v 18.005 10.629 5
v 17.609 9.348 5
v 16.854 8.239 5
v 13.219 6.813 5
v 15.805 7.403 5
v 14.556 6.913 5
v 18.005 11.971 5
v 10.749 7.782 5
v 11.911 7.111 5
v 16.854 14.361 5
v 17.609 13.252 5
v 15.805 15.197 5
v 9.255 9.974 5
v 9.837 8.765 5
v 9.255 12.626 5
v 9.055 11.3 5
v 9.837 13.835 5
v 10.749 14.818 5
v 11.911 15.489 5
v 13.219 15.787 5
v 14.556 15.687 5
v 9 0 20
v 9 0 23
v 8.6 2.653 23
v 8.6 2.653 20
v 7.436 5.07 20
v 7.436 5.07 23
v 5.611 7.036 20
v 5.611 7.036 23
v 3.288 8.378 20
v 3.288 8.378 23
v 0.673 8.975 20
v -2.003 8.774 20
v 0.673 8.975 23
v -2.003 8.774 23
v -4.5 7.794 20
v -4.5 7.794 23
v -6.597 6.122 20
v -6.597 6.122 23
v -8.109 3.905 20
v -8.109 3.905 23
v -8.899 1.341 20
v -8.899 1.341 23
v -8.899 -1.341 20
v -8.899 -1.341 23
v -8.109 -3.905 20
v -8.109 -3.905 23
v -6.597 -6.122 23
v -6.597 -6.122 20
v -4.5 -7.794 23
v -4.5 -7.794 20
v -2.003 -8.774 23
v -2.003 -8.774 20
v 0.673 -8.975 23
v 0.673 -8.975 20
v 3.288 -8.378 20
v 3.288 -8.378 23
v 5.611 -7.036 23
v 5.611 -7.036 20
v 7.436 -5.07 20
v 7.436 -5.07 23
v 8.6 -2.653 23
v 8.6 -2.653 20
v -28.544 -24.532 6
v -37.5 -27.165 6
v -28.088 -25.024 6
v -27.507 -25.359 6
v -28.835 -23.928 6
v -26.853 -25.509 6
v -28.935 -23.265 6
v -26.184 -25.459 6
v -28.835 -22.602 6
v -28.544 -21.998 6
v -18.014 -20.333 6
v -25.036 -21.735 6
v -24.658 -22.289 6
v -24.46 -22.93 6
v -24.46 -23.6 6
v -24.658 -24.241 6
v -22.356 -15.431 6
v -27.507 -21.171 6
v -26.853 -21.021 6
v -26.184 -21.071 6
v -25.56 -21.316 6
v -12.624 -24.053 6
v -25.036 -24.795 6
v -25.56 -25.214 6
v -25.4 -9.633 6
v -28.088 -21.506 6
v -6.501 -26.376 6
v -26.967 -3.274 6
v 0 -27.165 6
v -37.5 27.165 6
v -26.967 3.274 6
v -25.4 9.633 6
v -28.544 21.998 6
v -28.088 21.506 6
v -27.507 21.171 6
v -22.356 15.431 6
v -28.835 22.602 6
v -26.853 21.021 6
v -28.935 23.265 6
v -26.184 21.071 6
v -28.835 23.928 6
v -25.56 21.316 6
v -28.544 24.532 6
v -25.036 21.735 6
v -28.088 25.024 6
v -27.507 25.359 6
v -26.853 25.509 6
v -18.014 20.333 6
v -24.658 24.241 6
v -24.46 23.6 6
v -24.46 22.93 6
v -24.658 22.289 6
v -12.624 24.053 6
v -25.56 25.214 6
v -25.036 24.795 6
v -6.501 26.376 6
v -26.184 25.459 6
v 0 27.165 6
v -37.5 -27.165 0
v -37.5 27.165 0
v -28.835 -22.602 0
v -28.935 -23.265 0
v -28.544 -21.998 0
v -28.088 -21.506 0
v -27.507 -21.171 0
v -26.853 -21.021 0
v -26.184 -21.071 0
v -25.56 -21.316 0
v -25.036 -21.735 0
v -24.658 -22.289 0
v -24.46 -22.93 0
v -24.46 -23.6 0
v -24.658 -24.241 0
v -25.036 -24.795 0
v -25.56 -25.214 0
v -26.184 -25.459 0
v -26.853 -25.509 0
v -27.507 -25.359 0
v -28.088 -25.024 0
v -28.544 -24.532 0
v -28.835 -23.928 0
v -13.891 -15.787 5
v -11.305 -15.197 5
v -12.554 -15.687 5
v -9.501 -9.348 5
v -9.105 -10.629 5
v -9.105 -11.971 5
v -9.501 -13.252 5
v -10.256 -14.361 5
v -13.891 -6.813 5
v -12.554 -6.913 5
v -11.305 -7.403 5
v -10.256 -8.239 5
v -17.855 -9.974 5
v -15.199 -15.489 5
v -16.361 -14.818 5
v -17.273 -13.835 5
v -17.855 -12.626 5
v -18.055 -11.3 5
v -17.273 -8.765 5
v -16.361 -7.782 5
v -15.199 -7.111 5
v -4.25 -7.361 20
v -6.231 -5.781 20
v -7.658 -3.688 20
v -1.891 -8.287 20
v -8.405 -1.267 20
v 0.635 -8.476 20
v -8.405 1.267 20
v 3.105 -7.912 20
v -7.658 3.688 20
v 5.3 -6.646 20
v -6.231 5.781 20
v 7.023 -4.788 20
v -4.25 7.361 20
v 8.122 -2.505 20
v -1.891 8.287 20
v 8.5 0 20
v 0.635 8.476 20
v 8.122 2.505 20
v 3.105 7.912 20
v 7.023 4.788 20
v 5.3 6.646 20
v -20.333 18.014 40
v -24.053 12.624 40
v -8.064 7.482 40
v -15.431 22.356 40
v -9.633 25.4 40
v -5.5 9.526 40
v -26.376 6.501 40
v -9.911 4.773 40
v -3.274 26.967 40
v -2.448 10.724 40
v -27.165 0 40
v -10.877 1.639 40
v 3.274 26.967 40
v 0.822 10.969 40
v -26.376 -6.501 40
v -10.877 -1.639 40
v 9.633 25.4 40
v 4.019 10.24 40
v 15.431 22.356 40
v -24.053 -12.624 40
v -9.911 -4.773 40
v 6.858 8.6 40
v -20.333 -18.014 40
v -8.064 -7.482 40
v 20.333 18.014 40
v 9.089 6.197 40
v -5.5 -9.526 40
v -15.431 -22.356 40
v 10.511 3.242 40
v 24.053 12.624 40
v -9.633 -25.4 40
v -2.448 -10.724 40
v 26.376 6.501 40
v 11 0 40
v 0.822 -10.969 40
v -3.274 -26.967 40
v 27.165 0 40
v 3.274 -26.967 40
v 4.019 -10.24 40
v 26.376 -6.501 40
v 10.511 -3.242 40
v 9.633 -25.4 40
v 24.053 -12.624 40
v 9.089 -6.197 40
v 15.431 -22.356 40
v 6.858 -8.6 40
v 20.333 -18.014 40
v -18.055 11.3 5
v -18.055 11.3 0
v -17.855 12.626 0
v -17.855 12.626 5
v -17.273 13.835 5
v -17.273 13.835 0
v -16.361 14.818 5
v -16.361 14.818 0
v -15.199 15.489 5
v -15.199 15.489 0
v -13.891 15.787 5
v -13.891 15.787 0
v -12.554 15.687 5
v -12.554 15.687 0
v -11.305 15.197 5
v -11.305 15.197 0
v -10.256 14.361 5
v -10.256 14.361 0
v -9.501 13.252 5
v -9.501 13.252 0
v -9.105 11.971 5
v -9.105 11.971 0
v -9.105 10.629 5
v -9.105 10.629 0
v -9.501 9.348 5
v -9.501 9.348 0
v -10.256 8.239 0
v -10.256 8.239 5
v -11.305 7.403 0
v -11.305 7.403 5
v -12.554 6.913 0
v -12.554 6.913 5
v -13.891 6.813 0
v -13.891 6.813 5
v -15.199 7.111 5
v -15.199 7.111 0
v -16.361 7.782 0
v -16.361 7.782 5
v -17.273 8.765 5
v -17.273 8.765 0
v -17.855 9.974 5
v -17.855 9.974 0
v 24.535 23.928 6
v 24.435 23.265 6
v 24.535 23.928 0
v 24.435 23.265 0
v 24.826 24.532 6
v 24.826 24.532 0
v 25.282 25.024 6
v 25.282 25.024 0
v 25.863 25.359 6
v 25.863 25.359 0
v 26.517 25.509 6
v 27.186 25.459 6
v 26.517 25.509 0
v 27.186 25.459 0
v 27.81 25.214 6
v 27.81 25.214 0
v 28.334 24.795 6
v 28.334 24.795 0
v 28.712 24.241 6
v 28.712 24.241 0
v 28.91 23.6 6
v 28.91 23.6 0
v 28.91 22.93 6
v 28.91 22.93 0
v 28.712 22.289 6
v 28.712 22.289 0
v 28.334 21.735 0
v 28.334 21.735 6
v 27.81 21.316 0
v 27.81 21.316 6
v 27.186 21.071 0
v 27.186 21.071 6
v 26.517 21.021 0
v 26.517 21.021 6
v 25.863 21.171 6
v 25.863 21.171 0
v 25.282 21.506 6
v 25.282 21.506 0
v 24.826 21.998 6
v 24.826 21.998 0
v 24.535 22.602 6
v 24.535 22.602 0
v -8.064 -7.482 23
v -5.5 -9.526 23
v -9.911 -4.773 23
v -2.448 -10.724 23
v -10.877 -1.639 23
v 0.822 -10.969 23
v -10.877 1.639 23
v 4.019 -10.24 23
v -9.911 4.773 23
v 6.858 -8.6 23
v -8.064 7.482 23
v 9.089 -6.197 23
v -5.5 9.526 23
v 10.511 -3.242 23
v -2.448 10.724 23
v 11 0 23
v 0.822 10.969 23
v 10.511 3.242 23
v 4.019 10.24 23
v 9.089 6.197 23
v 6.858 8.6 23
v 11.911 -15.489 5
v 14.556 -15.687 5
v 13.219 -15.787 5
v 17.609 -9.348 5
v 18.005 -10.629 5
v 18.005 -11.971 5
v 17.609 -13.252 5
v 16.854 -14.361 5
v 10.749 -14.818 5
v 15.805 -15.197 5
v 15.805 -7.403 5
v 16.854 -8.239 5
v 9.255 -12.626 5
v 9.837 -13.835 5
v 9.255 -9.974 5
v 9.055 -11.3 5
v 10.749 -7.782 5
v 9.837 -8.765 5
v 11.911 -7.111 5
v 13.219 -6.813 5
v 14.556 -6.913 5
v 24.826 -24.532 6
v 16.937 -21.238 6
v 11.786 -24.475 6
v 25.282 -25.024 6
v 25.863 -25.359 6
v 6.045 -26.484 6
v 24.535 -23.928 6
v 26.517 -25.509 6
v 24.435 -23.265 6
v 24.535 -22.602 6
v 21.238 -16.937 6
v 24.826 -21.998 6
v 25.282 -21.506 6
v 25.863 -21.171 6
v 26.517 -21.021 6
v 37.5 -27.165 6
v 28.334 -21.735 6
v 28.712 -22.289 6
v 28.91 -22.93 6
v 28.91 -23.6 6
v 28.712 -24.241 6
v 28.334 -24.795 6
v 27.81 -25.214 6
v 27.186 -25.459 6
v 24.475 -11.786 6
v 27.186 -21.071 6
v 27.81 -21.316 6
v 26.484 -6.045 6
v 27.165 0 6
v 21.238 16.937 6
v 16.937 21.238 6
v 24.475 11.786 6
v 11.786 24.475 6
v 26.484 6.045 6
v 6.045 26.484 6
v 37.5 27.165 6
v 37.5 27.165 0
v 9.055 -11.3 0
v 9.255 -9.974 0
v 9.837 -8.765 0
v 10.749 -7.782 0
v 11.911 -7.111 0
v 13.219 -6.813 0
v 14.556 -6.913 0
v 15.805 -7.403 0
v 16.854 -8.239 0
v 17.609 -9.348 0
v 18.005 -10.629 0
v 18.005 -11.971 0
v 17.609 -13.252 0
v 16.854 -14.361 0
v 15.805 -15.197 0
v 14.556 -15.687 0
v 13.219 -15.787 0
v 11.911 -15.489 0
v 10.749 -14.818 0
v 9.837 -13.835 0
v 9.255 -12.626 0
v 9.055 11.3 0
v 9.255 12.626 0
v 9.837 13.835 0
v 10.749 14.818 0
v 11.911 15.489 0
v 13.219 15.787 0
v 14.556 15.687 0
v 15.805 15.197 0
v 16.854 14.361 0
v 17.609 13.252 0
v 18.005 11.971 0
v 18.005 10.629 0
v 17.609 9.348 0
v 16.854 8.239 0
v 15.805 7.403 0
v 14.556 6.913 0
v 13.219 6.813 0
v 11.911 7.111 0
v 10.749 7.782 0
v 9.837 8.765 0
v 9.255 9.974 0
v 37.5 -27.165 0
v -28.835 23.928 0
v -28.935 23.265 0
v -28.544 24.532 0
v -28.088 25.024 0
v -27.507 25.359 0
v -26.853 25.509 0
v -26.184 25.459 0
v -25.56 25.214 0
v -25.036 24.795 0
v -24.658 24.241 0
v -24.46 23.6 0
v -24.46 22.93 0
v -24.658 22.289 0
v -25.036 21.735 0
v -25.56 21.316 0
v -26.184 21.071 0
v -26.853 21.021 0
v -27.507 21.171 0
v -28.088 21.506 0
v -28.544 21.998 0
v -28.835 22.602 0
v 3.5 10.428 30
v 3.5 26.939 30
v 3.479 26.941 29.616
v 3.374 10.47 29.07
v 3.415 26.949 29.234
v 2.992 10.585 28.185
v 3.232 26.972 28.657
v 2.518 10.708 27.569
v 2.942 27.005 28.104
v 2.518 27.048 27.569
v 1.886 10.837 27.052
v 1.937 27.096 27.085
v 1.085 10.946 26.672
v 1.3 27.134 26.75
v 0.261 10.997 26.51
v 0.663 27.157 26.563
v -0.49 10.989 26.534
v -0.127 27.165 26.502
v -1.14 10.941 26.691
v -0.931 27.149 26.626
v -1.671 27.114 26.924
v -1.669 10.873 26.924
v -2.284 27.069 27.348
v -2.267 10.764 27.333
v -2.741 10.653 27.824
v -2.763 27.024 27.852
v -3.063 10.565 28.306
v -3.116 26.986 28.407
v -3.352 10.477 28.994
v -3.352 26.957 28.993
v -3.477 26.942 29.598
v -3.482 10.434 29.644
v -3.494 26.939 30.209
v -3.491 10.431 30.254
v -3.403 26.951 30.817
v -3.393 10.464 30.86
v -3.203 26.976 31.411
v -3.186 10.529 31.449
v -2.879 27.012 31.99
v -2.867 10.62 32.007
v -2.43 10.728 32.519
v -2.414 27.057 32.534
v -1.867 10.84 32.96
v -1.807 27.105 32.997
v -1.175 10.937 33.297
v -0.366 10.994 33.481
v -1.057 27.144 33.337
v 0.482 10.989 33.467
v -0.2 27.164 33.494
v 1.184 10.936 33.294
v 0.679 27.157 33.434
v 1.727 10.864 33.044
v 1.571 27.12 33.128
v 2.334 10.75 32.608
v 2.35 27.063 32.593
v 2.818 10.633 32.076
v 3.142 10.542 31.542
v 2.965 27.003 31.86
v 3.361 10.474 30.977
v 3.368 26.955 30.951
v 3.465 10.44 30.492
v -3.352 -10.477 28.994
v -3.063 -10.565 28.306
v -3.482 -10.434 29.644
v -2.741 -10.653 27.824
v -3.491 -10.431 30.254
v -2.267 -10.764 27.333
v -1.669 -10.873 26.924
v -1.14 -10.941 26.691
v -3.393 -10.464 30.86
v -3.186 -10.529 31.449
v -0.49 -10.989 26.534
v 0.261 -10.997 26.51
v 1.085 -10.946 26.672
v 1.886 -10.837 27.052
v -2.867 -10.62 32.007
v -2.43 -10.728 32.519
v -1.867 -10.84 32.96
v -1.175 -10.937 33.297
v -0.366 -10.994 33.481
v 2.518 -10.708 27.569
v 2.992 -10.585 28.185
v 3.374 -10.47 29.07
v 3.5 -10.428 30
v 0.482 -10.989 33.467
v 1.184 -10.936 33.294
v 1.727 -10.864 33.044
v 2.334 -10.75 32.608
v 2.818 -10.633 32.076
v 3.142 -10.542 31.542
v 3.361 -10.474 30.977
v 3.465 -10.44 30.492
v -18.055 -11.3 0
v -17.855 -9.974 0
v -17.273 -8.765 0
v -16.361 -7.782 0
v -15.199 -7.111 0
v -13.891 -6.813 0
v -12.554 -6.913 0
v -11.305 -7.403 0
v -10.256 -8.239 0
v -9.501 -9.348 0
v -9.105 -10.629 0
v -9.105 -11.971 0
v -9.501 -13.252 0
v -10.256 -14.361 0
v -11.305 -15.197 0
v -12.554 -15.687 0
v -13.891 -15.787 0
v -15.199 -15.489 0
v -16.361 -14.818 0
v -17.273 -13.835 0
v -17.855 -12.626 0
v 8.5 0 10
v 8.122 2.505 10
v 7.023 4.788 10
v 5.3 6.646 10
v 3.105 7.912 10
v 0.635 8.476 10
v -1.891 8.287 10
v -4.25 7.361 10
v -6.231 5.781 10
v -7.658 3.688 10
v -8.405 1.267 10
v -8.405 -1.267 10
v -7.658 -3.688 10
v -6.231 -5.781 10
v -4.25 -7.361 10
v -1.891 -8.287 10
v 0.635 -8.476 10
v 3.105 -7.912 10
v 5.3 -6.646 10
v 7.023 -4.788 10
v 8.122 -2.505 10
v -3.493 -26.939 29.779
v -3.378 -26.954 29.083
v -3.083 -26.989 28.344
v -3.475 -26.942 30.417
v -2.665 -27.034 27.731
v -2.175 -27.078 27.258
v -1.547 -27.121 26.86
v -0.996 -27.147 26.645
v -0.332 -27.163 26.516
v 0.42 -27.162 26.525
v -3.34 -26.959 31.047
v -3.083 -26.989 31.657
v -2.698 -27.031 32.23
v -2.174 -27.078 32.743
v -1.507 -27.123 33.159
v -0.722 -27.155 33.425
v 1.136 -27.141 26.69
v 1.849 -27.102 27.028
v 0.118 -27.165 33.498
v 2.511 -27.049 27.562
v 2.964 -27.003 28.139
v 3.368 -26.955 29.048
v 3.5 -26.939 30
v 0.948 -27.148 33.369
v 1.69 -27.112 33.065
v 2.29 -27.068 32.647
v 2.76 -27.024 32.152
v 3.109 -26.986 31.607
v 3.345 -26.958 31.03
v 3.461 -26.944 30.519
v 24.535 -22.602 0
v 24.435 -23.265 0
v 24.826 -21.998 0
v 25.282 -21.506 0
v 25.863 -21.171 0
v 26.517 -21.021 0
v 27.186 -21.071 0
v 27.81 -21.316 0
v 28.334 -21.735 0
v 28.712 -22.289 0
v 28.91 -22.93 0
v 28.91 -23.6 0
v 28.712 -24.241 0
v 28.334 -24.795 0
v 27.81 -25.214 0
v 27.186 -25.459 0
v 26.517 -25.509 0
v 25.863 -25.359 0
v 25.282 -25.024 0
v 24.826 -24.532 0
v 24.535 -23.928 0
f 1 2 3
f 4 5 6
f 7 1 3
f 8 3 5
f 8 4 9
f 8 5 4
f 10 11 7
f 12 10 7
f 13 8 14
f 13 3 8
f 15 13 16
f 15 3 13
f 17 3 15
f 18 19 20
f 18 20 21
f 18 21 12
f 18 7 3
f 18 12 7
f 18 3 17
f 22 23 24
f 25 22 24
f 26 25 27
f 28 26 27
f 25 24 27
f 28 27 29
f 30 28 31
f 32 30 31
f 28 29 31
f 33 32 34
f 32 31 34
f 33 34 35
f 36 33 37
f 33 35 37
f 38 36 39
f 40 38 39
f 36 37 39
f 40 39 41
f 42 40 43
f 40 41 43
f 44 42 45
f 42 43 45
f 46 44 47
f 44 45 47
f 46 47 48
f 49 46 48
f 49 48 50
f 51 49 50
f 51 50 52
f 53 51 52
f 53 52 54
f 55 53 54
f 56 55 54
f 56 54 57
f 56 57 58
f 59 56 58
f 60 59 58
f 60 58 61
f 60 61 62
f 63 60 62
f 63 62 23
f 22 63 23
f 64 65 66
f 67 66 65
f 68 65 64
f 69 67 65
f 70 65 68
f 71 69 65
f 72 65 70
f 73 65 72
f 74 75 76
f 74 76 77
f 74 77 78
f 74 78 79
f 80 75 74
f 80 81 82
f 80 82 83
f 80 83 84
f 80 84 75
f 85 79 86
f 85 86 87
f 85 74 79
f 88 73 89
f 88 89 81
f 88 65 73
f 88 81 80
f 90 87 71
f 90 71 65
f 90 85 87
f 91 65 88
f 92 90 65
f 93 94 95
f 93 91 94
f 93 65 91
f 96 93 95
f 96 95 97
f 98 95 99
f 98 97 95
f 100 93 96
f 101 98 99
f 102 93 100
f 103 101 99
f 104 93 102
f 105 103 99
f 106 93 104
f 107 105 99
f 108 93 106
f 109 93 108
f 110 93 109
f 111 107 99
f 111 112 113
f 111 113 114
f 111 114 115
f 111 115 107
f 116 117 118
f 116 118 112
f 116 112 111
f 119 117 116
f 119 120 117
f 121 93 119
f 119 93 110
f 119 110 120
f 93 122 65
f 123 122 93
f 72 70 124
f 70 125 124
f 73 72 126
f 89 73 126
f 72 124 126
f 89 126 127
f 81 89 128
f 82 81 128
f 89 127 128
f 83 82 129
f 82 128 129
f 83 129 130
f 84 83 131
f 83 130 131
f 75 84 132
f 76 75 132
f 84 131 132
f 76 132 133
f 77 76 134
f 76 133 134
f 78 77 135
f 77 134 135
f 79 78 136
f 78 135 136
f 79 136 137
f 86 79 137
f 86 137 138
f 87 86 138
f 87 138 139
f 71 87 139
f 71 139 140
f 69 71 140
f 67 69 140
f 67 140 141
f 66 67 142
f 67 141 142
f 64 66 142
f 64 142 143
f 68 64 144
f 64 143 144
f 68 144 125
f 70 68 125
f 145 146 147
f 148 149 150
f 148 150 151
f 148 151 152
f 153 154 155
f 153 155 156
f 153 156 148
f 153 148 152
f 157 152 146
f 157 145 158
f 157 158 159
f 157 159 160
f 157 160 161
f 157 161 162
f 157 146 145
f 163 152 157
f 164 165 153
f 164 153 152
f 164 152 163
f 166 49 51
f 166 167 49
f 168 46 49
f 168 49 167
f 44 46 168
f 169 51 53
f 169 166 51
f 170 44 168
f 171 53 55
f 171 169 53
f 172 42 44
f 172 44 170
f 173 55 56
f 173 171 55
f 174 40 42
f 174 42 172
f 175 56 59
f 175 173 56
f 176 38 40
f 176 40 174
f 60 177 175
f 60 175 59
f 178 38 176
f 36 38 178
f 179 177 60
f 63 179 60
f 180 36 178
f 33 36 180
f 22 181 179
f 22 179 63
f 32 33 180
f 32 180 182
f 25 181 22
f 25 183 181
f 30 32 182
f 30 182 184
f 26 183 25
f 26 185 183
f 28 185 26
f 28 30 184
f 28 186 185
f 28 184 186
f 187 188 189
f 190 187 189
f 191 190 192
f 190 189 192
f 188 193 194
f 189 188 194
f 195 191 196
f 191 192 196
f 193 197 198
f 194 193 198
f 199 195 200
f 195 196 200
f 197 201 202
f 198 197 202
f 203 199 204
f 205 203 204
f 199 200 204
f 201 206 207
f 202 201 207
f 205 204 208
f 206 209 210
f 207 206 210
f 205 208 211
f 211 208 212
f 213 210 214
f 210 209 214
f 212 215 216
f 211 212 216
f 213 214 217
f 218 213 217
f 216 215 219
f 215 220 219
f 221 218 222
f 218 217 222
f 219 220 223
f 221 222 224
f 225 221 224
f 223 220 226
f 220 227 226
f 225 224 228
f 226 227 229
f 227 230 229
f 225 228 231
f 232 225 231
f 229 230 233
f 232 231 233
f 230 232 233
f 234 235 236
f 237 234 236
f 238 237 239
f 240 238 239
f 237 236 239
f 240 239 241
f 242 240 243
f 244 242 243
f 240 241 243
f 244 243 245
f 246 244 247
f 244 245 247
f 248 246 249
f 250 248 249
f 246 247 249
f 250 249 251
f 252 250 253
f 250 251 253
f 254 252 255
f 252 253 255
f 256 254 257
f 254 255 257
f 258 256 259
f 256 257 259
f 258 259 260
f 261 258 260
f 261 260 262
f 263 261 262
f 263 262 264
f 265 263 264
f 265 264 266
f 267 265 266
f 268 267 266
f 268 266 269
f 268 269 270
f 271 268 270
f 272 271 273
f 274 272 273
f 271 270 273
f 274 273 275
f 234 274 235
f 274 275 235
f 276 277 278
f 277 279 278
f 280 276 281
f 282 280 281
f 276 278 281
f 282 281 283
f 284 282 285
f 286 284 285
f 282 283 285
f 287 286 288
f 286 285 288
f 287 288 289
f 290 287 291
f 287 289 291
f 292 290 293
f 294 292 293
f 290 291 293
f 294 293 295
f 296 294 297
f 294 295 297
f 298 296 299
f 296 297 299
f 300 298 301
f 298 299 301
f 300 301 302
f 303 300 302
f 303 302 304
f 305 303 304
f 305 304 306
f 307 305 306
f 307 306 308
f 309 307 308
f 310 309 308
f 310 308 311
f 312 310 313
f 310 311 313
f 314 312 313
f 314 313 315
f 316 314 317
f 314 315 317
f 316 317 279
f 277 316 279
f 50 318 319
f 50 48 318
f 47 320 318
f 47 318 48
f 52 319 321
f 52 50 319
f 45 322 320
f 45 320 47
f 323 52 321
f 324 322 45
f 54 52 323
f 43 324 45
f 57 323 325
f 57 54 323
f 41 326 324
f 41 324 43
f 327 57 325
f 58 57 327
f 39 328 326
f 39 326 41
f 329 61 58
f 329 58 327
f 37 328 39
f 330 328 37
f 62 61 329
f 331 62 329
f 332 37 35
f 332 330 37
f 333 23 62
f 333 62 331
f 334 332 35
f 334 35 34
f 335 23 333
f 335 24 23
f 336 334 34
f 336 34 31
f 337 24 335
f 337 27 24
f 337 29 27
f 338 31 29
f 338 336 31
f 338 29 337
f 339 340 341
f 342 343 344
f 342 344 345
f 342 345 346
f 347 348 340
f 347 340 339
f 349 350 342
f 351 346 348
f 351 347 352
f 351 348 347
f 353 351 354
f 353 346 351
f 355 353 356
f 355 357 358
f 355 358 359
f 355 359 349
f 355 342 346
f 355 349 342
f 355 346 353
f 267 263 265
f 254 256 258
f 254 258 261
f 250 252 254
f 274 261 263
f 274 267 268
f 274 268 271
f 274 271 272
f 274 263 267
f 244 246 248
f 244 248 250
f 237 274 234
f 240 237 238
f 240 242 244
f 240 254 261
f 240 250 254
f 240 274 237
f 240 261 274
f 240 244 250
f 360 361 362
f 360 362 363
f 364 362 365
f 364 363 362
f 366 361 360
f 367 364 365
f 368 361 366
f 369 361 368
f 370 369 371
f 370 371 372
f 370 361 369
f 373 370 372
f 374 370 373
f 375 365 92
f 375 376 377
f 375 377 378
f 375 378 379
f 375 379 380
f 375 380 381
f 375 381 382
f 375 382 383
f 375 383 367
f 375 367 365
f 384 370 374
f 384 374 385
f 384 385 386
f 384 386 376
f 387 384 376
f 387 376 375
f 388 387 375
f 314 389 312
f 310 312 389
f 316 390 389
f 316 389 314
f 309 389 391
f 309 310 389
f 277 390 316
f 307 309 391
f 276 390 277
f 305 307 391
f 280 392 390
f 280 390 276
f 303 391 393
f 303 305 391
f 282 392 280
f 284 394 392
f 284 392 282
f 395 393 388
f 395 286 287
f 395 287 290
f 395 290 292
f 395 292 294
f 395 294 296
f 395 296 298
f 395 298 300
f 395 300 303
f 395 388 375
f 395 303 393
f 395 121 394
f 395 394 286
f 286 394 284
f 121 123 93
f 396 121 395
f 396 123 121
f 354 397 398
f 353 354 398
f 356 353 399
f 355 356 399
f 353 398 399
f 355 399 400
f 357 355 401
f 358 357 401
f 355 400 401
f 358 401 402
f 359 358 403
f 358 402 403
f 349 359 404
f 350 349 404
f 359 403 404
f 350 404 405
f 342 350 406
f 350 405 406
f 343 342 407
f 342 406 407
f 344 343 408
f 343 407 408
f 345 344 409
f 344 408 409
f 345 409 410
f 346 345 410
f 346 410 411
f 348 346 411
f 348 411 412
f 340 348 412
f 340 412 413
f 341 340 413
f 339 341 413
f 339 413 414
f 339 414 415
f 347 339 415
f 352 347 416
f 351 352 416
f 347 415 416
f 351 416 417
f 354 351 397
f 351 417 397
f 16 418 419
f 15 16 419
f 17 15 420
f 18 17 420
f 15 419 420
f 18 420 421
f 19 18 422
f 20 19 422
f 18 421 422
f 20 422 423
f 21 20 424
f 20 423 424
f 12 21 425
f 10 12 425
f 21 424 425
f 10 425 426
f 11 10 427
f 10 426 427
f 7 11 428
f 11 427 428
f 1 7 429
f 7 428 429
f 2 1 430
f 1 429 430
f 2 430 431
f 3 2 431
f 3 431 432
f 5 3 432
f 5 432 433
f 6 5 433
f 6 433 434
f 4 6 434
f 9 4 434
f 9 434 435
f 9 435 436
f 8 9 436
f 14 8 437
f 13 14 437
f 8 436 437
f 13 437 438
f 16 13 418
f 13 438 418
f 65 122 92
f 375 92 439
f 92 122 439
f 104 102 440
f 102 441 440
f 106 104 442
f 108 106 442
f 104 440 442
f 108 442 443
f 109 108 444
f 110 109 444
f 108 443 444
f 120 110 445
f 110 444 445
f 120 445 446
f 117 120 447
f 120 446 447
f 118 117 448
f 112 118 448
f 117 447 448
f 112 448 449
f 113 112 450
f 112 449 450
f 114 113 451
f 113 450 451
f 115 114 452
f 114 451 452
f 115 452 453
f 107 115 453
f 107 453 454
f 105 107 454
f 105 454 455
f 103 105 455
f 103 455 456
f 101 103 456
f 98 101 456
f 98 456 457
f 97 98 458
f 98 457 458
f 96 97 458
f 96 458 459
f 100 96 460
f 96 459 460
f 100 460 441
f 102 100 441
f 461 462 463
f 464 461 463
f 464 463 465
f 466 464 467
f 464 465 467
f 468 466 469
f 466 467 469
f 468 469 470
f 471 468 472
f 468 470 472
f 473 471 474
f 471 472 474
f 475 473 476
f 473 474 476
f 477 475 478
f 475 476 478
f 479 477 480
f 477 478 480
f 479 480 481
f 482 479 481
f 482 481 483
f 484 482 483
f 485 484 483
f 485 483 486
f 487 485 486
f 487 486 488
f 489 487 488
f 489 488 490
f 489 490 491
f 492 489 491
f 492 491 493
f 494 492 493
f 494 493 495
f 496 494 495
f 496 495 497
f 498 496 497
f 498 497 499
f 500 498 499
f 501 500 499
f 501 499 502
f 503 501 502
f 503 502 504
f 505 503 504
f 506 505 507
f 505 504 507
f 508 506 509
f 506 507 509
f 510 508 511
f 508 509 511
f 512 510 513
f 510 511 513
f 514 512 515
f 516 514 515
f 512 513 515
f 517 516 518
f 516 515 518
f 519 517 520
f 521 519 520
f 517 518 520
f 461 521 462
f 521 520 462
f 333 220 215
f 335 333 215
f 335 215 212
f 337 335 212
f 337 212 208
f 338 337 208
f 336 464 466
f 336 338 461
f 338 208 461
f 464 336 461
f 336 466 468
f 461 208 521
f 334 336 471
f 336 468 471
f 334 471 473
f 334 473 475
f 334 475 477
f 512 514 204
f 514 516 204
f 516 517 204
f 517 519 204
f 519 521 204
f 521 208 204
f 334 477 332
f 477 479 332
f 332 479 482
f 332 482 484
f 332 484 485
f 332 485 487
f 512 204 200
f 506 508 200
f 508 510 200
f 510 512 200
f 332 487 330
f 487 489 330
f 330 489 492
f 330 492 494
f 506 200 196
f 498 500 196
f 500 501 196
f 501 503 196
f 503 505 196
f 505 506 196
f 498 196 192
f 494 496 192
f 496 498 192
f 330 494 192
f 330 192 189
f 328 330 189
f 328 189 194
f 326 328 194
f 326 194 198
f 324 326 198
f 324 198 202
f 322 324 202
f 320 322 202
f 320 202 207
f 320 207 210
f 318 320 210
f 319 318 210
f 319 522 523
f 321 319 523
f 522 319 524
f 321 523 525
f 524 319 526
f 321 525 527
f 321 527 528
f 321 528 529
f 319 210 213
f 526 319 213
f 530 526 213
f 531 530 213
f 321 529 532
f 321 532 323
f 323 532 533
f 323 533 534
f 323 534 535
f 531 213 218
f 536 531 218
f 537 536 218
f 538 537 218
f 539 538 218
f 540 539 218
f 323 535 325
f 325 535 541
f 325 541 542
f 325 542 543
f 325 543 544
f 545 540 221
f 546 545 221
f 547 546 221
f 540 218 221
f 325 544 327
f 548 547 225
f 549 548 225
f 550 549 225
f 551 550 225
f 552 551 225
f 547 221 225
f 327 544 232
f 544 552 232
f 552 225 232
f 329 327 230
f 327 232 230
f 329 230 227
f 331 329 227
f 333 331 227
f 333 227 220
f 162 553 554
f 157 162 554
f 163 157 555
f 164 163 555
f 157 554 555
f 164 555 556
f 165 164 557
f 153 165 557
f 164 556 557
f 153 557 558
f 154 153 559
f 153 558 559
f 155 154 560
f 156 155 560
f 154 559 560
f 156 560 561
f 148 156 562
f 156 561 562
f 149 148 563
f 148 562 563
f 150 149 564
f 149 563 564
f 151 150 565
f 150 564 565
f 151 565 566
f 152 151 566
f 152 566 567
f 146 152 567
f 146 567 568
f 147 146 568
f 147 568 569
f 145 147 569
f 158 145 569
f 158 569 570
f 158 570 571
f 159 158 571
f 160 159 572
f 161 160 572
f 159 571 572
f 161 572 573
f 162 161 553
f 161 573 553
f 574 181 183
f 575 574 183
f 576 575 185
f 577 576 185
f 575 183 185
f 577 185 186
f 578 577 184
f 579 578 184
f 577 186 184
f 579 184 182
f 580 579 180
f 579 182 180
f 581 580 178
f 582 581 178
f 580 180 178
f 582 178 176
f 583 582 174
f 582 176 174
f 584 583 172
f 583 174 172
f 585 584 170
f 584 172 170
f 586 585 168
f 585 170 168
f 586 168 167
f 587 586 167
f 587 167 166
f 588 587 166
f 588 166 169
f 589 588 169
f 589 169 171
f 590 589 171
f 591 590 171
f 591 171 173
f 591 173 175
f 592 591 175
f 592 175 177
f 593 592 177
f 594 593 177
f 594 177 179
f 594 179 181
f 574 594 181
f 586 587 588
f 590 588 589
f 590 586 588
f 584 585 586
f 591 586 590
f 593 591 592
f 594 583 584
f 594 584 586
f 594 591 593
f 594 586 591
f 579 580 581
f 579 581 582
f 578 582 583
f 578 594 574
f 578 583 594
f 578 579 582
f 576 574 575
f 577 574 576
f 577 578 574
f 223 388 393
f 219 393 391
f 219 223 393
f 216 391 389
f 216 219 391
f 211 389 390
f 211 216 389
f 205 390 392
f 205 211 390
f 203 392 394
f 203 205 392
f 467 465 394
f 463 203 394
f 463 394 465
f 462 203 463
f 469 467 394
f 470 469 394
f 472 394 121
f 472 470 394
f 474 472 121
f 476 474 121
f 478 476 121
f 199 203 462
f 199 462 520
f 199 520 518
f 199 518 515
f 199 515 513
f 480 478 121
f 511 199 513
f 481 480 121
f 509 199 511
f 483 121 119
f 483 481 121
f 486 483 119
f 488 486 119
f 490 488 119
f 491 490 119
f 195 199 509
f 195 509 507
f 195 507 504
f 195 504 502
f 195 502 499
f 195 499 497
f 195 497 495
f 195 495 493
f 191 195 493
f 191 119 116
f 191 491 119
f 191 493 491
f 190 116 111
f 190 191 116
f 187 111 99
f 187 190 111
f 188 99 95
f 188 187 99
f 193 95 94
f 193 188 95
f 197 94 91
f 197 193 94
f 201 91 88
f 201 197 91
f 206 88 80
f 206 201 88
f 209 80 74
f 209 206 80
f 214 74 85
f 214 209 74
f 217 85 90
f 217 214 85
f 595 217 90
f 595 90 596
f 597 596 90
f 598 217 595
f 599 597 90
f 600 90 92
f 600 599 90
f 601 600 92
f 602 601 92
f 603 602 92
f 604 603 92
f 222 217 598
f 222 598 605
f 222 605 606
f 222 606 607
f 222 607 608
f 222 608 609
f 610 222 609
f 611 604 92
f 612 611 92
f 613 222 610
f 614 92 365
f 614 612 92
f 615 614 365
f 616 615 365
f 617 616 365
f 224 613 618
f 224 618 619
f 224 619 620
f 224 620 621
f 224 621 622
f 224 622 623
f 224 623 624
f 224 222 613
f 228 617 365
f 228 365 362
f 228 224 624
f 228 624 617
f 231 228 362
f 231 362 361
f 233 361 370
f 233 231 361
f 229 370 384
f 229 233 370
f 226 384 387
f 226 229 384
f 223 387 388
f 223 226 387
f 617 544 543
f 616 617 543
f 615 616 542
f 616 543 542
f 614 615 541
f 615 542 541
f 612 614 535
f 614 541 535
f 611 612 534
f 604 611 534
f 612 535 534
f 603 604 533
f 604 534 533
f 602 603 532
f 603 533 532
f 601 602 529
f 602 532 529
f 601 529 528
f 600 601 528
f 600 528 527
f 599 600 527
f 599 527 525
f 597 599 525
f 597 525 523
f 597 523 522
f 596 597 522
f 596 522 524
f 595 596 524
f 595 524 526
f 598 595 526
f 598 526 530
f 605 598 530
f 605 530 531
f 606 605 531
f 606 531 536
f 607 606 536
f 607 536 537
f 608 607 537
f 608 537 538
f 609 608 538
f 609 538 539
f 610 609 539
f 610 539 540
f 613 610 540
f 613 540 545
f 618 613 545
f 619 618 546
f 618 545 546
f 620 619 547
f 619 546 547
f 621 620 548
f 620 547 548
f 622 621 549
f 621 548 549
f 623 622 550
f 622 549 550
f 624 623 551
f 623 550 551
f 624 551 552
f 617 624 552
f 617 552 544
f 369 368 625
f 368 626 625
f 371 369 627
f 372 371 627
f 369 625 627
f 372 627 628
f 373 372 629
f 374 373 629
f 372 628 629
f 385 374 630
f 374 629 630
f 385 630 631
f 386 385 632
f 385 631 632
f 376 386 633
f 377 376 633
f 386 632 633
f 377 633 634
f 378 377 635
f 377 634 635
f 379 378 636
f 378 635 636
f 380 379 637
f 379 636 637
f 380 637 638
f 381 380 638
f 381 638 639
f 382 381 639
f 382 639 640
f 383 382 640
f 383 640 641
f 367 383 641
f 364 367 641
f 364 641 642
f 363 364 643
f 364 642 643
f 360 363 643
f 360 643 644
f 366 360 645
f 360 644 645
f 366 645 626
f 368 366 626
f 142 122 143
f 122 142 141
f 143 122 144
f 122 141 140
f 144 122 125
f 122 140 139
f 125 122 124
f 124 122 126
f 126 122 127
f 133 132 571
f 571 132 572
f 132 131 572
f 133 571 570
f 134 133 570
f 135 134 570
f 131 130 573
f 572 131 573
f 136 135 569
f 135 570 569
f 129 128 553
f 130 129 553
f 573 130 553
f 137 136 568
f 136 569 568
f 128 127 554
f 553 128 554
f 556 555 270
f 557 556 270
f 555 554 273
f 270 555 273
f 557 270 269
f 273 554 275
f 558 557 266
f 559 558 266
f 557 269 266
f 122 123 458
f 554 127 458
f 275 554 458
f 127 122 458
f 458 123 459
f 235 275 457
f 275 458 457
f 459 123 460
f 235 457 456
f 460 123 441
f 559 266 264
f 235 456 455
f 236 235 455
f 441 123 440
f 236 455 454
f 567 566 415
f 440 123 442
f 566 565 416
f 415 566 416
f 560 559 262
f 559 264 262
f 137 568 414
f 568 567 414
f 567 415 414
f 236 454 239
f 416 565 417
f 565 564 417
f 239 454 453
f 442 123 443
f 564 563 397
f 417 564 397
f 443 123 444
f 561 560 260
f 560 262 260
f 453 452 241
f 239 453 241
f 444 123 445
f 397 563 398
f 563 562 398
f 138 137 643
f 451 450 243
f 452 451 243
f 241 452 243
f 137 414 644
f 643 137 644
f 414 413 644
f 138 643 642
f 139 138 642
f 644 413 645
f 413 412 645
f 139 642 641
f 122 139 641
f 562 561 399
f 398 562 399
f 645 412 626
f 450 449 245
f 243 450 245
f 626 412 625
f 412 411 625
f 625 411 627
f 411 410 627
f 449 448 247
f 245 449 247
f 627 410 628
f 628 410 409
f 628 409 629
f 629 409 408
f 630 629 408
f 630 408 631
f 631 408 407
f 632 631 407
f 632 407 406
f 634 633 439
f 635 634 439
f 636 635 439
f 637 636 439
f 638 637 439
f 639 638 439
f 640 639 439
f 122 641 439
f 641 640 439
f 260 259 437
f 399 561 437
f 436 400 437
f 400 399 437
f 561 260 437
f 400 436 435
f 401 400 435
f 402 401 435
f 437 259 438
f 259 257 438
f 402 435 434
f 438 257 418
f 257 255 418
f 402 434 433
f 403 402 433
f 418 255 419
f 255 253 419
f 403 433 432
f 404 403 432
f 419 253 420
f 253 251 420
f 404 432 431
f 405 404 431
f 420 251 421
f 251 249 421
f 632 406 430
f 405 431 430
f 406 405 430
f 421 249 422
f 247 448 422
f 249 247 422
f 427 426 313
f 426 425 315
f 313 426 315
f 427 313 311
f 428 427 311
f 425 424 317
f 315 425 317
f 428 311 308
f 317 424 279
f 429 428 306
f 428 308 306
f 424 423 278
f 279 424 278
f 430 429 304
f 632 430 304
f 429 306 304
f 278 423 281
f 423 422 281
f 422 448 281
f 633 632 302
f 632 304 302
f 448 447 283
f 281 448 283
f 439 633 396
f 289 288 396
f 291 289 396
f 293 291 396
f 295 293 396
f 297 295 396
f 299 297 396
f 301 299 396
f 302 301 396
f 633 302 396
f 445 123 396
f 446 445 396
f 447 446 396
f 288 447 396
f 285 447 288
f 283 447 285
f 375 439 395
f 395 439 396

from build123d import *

# Parameters (mm, degrees)
SKETCH1_W                      = 75
SKETCH1_H                      = 54.33
BOSS_EXTRUDE1_DEPTH            = 45
CBORE_FOR_M4_SHCS1_D           = 4.5
CBORE_FOR_M4_SHCS1_CBORE_D     = 8
CBORE_FOR_M4_SHCS1_CBORE_DEPTH = 4
SKETCH4_OUTSIDE_W              = 97.592
SKETCH4_OUTSIDE_H              = 67.592
SKETCH4_OUTSIDE_W_2            = 75
SKETCH4_OUTSIDE_H_2            = 40
CUT_EXTRUDE1_DEPTH             = 55.33
SKETCH5_R                      = 8.5
CUT_EXTRUDE2_DEPTH             = 30
SKETCH5_3_R                    = 9
CUT_EXTRUDE3_DEPTH             = 20
SKETCH5_4_R                    = 11
CUT_EXTRUDE4_DEPTH             = 17
SKETCH6_R                      = 3.5
CUT_EXTRUDE5_DEPTH             = 55.33
SKETCH29_OUTSIDE_W             = 97.176
SKETCH29_OUTSIDE_H             = 76.506
SKETCH29_OUTSIDE_R             = 27.165
CUT_EXTRUDE6_DEPTH             = 34
SKETCH30_R                     = 4.5
CUT_EXTRUDE7_DEPTH             = 5


with BuildPart() as part:
    # Sketch1 → Boss-Extrude1 (new body)
    with BuildSketch(Plane.XY):
        Rectangle(SKETCH1_W, SKETCH1_H)
    extrude(amount=BOSS_EXTRUDE1_DEPTH)

    # CBORE for M4 SHCS1 (through all)
    with Locations(Plane.XY.offset(45)):
        with Locations((26.685, -23.265), (26.685, 23.265), (-26.685, 23.265), (-26.685, -23.265)):
            CounterBoreHole(CBORE_FOR_M4_SHCS1_D / 2, CBORE_FOR_M4_SHCS1_CBORE_D / 2, CBORE_FOR_M4_SHCS1_CBORE_DEPTH)

    # Sketch4 outside → Cut-Extrude1 (cut, through all)
    with BuildSketch(Plane.XZ.offset(27.165)):
        with Locations((0, 22.5)):
            Rectangle(SKETCH4_OUTSIDE_W, SKETCH4_OUTSIDE_H)
        with Locations((0, 20)):
            Rectangle(SKETCH4_OUTSIDE_W_2, SKETCH4_OUTSIDE_H_2, mode=Mode.SUBTRACT)
    extrude(amount=-CUT_EXTRUDE1_DEPTH, mode=Mode.SUBTRACT)

    # Sketch5 → Cut-Extrude2 (cut)
    with BuildSketch(Plane.XY.offset(40)):
        Circle(SKETCH5_R)
    extrude(amount=-CUT_EXTRUDE2_DEPTH, mode=Mode.SUBTRACT)

    # Sketch5<3> → Cut-Extrude3 (cut)
    with BuildSketch(Plane.XY.offset(40)):
        Circle(SKETCH5_3_R)
    extrude(amount=-CUT_EXTRUDE3_DEPTH, mode=Mode.SUBTRACT)

    # Sketch5<4> → Cut-Extrude4 (cut)
    with BuildSketch(Plane.XY.offset(40)):
        Circle(SKETCH5_4_R)
    extrude(amount=-CUT_EXTRUDE4_DEPTH, mode=Mode.SUBTRACT)

    # Sketch6 → Cut-Extrude5 (cut, through all)
    with BuildSketch(Plane(origin=(0, 27.165, 0), x_dir=(1, 0, 0), z_dir=(0, 1, 0))):
        with Locations((0, -30)):
            Circle(SKETCH6_R)
    extrude(amount=-CUT_EXTRUDE5_DEPTH, mode=Mode.SUBTRACT)

    # Sketch29 outside → Cut-Extrude6 (cut)
    with BuildSketch(Plane.XY.offset(40)):
        Rectangle(SKETCH29_OUTSIDE_W, SKETCH29_OUTSIDE_H)
        Circle(SKETCH29_OUTSIDE_R, mode=Mode.SUBTRACT)
    extrude(amount=-CUT_EXTRUDE6_DEPTH, mode=Mode.SUBTRACT)

    # Sketch30 → Cut-Extrude7 (cut)
    with BuildSketch(Plane(origin=(0, 0, 0), x_dir=(-1, 0, 0), z_dir=(0, 0, -1))):
        with Locations((-13.555, 11.3)):
            Circle(SKETCH30_R)
        with Locations((13.555, 11.3)):
            Circle(SKETCH30_R)
        with Locations((13.555, -11.3)):
            Circle(SKETCH30_R)
        with Locations((-13.555, -11.3)):
            Circle(SKETCH30_R)
    extrude(amount=-CUT_EXTRUDE7_DEPTH, mode=Mode.SUBTRACT)


solid = part.part
